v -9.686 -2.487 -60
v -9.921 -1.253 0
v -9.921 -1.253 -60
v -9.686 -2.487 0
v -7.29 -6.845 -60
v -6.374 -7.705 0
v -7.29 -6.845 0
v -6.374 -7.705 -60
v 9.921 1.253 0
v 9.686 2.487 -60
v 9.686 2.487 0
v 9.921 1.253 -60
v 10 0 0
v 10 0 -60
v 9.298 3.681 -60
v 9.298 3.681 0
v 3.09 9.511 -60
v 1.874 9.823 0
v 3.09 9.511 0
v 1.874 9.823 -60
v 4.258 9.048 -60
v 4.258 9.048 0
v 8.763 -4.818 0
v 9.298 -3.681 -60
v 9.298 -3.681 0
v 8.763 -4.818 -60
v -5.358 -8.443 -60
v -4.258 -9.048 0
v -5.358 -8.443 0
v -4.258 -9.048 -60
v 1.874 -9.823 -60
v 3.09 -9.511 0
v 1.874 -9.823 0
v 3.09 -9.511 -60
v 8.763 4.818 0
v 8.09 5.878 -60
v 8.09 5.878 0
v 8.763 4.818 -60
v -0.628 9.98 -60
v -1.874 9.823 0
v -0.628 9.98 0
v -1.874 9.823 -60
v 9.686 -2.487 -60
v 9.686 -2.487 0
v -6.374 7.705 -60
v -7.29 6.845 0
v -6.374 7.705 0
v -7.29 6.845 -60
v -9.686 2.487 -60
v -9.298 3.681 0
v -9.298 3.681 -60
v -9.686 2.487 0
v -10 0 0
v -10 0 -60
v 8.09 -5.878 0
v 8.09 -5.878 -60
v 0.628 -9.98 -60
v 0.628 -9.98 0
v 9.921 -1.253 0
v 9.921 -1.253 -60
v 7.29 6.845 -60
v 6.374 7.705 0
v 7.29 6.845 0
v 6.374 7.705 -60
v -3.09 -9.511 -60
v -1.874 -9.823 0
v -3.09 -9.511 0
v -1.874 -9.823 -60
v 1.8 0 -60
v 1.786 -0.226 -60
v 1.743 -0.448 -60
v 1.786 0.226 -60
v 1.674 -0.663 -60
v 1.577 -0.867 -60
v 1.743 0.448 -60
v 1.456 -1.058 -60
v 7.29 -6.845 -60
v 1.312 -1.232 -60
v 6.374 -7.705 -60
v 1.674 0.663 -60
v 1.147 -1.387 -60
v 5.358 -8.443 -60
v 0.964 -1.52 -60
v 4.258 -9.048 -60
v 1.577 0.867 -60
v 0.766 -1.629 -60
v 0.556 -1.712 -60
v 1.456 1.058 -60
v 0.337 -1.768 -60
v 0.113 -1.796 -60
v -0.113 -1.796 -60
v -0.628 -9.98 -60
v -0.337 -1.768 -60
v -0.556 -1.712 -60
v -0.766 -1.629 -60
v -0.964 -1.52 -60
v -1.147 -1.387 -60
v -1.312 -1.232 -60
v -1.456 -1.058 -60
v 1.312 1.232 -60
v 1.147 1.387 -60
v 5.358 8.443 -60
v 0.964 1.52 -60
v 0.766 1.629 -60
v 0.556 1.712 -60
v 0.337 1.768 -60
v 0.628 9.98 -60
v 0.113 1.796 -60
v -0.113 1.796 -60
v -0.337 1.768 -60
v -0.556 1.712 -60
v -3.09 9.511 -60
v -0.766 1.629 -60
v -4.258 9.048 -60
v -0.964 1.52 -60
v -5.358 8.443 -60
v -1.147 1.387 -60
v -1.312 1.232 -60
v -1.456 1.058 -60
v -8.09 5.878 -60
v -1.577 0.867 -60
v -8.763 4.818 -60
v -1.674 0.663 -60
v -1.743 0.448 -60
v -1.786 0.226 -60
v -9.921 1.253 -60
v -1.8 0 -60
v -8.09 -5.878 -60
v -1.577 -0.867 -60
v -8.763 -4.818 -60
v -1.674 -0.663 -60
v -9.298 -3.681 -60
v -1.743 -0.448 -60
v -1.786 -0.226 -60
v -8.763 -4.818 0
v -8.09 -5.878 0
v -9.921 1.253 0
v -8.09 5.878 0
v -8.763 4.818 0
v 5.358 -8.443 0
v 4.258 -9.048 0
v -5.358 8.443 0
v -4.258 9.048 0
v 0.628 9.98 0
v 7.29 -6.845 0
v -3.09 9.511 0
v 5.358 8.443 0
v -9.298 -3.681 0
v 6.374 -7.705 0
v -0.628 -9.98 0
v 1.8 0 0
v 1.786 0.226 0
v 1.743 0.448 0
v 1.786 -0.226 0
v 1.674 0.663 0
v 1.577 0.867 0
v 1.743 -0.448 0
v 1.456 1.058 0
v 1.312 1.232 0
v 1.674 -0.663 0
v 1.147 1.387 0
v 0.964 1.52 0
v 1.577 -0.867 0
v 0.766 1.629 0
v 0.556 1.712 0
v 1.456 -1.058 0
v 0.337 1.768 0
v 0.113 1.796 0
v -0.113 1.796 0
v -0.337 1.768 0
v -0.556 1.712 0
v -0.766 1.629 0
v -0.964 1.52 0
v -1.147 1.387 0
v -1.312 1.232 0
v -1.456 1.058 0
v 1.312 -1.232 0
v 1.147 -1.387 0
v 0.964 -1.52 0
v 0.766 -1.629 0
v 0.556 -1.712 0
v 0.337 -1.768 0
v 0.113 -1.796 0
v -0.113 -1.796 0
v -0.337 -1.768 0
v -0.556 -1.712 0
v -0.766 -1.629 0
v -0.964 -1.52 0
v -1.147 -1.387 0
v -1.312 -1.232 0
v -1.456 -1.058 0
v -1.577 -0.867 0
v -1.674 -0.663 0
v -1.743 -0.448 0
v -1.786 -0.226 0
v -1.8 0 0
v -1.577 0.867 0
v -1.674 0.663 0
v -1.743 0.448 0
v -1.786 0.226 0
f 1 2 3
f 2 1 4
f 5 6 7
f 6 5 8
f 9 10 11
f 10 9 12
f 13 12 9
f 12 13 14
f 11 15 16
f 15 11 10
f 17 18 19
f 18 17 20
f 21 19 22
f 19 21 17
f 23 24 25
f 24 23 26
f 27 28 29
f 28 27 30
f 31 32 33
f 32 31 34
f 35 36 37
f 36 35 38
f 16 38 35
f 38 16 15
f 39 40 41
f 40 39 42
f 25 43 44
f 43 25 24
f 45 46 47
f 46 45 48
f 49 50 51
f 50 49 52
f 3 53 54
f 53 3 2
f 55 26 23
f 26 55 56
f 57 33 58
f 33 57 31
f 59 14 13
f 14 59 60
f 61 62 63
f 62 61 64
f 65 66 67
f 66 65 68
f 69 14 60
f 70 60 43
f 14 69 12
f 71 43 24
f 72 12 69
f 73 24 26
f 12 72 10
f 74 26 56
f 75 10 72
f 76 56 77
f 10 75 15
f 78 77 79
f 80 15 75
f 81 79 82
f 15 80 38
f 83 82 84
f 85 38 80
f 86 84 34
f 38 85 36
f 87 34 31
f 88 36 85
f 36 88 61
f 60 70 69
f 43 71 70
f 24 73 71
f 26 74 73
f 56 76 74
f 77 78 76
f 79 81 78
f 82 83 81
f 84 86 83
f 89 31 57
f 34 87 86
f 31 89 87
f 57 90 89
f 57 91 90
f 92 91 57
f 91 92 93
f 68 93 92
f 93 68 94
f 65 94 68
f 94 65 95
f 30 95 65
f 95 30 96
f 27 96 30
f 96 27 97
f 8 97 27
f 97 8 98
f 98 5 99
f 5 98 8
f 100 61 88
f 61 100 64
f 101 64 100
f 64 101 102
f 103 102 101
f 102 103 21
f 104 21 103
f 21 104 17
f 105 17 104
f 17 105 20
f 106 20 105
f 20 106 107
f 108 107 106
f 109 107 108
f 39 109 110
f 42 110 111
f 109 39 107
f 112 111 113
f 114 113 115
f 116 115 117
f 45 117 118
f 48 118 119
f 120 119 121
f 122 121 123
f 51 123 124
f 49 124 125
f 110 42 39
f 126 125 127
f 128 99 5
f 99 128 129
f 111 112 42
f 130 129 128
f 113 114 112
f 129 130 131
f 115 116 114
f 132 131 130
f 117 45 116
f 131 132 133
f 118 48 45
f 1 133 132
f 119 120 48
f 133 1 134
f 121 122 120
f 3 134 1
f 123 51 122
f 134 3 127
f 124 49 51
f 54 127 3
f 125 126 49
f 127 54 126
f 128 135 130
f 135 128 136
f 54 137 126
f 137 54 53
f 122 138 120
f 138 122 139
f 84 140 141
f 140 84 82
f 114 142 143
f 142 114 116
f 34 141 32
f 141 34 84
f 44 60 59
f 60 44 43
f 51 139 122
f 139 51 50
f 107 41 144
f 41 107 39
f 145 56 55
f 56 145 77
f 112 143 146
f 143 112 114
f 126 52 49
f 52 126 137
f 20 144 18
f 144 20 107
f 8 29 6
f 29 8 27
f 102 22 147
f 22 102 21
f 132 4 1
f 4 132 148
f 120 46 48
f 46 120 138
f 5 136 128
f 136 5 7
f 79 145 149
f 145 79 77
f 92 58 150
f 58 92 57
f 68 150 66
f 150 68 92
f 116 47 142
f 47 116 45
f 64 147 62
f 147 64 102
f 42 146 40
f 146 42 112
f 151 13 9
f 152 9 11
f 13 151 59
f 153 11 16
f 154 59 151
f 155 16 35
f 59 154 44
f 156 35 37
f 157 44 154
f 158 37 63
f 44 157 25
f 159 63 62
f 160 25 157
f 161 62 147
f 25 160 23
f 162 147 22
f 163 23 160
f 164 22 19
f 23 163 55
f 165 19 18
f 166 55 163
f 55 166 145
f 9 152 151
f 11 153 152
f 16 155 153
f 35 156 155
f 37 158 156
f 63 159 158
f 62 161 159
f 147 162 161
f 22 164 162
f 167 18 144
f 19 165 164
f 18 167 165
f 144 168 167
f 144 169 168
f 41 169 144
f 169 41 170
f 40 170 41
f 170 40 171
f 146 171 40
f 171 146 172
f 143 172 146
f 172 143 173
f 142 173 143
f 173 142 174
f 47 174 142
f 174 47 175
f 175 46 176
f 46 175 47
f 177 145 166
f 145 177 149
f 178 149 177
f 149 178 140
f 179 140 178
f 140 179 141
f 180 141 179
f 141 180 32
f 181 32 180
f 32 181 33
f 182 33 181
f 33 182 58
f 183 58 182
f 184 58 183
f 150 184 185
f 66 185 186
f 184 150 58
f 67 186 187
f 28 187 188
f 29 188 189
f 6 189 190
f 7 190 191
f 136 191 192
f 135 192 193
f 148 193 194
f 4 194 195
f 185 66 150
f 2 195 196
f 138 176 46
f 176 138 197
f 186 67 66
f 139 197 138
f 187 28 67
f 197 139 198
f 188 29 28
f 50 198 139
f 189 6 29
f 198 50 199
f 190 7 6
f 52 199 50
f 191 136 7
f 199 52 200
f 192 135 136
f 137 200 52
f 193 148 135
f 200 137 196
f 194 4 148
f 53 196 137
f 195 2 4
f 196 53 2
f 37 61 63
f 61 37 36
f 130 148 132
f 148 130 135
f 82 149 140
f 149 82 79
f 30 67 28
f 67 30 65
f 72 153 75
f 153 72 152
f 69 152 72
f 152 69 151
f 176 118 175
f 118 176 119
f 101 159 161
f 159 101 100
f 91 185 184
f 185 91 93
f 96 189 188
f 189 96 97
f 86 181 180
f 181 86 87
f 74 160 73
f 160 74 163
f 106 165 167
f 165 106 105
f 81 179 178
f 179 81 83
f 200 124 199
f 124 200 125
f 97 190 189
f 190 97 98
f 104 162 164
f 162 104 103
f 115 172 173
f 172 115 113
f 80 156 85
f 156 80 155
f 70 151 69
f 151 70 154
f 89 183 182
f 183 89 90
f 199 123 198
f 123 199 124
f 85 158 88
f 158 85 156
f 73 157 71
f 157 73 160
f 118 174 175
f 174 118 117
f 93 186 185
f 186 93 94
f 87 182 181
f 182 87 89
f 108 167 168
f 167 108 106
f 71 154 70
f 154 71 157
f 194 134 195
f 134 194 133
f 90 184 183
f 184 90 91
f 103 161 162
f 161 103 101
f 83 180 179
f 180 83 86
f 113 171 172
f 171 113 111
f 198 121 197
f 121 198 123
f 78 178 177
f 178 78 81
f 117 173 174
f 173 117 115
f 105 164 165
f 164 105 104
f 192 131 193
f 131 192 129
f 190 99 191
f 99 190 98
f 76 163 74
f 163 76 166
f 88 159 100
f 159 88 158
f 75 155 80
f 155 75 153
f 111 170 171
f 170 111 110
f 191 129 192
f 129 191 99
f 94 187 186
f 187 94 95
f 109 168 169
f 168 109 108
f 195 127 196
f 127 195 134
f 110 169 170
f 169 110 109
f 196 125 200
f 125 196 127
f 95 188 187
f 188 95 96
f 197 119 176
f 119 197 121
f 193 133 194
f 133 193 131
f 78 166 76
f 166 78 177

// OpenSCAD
$fn = 50;


difference() {
	union() {
		translate(v = [0, 0, -60.0000000000]) {
			cylinder(h = 60, r = 10.0000000000);
		}
		cylinder(h = 0, r = 20.0000000000);
	}
	union() {
		#translate(v = [0, 0, -60]) {
			cylinder(h = 60, r = 1.8000000000);
		}
	}
}
